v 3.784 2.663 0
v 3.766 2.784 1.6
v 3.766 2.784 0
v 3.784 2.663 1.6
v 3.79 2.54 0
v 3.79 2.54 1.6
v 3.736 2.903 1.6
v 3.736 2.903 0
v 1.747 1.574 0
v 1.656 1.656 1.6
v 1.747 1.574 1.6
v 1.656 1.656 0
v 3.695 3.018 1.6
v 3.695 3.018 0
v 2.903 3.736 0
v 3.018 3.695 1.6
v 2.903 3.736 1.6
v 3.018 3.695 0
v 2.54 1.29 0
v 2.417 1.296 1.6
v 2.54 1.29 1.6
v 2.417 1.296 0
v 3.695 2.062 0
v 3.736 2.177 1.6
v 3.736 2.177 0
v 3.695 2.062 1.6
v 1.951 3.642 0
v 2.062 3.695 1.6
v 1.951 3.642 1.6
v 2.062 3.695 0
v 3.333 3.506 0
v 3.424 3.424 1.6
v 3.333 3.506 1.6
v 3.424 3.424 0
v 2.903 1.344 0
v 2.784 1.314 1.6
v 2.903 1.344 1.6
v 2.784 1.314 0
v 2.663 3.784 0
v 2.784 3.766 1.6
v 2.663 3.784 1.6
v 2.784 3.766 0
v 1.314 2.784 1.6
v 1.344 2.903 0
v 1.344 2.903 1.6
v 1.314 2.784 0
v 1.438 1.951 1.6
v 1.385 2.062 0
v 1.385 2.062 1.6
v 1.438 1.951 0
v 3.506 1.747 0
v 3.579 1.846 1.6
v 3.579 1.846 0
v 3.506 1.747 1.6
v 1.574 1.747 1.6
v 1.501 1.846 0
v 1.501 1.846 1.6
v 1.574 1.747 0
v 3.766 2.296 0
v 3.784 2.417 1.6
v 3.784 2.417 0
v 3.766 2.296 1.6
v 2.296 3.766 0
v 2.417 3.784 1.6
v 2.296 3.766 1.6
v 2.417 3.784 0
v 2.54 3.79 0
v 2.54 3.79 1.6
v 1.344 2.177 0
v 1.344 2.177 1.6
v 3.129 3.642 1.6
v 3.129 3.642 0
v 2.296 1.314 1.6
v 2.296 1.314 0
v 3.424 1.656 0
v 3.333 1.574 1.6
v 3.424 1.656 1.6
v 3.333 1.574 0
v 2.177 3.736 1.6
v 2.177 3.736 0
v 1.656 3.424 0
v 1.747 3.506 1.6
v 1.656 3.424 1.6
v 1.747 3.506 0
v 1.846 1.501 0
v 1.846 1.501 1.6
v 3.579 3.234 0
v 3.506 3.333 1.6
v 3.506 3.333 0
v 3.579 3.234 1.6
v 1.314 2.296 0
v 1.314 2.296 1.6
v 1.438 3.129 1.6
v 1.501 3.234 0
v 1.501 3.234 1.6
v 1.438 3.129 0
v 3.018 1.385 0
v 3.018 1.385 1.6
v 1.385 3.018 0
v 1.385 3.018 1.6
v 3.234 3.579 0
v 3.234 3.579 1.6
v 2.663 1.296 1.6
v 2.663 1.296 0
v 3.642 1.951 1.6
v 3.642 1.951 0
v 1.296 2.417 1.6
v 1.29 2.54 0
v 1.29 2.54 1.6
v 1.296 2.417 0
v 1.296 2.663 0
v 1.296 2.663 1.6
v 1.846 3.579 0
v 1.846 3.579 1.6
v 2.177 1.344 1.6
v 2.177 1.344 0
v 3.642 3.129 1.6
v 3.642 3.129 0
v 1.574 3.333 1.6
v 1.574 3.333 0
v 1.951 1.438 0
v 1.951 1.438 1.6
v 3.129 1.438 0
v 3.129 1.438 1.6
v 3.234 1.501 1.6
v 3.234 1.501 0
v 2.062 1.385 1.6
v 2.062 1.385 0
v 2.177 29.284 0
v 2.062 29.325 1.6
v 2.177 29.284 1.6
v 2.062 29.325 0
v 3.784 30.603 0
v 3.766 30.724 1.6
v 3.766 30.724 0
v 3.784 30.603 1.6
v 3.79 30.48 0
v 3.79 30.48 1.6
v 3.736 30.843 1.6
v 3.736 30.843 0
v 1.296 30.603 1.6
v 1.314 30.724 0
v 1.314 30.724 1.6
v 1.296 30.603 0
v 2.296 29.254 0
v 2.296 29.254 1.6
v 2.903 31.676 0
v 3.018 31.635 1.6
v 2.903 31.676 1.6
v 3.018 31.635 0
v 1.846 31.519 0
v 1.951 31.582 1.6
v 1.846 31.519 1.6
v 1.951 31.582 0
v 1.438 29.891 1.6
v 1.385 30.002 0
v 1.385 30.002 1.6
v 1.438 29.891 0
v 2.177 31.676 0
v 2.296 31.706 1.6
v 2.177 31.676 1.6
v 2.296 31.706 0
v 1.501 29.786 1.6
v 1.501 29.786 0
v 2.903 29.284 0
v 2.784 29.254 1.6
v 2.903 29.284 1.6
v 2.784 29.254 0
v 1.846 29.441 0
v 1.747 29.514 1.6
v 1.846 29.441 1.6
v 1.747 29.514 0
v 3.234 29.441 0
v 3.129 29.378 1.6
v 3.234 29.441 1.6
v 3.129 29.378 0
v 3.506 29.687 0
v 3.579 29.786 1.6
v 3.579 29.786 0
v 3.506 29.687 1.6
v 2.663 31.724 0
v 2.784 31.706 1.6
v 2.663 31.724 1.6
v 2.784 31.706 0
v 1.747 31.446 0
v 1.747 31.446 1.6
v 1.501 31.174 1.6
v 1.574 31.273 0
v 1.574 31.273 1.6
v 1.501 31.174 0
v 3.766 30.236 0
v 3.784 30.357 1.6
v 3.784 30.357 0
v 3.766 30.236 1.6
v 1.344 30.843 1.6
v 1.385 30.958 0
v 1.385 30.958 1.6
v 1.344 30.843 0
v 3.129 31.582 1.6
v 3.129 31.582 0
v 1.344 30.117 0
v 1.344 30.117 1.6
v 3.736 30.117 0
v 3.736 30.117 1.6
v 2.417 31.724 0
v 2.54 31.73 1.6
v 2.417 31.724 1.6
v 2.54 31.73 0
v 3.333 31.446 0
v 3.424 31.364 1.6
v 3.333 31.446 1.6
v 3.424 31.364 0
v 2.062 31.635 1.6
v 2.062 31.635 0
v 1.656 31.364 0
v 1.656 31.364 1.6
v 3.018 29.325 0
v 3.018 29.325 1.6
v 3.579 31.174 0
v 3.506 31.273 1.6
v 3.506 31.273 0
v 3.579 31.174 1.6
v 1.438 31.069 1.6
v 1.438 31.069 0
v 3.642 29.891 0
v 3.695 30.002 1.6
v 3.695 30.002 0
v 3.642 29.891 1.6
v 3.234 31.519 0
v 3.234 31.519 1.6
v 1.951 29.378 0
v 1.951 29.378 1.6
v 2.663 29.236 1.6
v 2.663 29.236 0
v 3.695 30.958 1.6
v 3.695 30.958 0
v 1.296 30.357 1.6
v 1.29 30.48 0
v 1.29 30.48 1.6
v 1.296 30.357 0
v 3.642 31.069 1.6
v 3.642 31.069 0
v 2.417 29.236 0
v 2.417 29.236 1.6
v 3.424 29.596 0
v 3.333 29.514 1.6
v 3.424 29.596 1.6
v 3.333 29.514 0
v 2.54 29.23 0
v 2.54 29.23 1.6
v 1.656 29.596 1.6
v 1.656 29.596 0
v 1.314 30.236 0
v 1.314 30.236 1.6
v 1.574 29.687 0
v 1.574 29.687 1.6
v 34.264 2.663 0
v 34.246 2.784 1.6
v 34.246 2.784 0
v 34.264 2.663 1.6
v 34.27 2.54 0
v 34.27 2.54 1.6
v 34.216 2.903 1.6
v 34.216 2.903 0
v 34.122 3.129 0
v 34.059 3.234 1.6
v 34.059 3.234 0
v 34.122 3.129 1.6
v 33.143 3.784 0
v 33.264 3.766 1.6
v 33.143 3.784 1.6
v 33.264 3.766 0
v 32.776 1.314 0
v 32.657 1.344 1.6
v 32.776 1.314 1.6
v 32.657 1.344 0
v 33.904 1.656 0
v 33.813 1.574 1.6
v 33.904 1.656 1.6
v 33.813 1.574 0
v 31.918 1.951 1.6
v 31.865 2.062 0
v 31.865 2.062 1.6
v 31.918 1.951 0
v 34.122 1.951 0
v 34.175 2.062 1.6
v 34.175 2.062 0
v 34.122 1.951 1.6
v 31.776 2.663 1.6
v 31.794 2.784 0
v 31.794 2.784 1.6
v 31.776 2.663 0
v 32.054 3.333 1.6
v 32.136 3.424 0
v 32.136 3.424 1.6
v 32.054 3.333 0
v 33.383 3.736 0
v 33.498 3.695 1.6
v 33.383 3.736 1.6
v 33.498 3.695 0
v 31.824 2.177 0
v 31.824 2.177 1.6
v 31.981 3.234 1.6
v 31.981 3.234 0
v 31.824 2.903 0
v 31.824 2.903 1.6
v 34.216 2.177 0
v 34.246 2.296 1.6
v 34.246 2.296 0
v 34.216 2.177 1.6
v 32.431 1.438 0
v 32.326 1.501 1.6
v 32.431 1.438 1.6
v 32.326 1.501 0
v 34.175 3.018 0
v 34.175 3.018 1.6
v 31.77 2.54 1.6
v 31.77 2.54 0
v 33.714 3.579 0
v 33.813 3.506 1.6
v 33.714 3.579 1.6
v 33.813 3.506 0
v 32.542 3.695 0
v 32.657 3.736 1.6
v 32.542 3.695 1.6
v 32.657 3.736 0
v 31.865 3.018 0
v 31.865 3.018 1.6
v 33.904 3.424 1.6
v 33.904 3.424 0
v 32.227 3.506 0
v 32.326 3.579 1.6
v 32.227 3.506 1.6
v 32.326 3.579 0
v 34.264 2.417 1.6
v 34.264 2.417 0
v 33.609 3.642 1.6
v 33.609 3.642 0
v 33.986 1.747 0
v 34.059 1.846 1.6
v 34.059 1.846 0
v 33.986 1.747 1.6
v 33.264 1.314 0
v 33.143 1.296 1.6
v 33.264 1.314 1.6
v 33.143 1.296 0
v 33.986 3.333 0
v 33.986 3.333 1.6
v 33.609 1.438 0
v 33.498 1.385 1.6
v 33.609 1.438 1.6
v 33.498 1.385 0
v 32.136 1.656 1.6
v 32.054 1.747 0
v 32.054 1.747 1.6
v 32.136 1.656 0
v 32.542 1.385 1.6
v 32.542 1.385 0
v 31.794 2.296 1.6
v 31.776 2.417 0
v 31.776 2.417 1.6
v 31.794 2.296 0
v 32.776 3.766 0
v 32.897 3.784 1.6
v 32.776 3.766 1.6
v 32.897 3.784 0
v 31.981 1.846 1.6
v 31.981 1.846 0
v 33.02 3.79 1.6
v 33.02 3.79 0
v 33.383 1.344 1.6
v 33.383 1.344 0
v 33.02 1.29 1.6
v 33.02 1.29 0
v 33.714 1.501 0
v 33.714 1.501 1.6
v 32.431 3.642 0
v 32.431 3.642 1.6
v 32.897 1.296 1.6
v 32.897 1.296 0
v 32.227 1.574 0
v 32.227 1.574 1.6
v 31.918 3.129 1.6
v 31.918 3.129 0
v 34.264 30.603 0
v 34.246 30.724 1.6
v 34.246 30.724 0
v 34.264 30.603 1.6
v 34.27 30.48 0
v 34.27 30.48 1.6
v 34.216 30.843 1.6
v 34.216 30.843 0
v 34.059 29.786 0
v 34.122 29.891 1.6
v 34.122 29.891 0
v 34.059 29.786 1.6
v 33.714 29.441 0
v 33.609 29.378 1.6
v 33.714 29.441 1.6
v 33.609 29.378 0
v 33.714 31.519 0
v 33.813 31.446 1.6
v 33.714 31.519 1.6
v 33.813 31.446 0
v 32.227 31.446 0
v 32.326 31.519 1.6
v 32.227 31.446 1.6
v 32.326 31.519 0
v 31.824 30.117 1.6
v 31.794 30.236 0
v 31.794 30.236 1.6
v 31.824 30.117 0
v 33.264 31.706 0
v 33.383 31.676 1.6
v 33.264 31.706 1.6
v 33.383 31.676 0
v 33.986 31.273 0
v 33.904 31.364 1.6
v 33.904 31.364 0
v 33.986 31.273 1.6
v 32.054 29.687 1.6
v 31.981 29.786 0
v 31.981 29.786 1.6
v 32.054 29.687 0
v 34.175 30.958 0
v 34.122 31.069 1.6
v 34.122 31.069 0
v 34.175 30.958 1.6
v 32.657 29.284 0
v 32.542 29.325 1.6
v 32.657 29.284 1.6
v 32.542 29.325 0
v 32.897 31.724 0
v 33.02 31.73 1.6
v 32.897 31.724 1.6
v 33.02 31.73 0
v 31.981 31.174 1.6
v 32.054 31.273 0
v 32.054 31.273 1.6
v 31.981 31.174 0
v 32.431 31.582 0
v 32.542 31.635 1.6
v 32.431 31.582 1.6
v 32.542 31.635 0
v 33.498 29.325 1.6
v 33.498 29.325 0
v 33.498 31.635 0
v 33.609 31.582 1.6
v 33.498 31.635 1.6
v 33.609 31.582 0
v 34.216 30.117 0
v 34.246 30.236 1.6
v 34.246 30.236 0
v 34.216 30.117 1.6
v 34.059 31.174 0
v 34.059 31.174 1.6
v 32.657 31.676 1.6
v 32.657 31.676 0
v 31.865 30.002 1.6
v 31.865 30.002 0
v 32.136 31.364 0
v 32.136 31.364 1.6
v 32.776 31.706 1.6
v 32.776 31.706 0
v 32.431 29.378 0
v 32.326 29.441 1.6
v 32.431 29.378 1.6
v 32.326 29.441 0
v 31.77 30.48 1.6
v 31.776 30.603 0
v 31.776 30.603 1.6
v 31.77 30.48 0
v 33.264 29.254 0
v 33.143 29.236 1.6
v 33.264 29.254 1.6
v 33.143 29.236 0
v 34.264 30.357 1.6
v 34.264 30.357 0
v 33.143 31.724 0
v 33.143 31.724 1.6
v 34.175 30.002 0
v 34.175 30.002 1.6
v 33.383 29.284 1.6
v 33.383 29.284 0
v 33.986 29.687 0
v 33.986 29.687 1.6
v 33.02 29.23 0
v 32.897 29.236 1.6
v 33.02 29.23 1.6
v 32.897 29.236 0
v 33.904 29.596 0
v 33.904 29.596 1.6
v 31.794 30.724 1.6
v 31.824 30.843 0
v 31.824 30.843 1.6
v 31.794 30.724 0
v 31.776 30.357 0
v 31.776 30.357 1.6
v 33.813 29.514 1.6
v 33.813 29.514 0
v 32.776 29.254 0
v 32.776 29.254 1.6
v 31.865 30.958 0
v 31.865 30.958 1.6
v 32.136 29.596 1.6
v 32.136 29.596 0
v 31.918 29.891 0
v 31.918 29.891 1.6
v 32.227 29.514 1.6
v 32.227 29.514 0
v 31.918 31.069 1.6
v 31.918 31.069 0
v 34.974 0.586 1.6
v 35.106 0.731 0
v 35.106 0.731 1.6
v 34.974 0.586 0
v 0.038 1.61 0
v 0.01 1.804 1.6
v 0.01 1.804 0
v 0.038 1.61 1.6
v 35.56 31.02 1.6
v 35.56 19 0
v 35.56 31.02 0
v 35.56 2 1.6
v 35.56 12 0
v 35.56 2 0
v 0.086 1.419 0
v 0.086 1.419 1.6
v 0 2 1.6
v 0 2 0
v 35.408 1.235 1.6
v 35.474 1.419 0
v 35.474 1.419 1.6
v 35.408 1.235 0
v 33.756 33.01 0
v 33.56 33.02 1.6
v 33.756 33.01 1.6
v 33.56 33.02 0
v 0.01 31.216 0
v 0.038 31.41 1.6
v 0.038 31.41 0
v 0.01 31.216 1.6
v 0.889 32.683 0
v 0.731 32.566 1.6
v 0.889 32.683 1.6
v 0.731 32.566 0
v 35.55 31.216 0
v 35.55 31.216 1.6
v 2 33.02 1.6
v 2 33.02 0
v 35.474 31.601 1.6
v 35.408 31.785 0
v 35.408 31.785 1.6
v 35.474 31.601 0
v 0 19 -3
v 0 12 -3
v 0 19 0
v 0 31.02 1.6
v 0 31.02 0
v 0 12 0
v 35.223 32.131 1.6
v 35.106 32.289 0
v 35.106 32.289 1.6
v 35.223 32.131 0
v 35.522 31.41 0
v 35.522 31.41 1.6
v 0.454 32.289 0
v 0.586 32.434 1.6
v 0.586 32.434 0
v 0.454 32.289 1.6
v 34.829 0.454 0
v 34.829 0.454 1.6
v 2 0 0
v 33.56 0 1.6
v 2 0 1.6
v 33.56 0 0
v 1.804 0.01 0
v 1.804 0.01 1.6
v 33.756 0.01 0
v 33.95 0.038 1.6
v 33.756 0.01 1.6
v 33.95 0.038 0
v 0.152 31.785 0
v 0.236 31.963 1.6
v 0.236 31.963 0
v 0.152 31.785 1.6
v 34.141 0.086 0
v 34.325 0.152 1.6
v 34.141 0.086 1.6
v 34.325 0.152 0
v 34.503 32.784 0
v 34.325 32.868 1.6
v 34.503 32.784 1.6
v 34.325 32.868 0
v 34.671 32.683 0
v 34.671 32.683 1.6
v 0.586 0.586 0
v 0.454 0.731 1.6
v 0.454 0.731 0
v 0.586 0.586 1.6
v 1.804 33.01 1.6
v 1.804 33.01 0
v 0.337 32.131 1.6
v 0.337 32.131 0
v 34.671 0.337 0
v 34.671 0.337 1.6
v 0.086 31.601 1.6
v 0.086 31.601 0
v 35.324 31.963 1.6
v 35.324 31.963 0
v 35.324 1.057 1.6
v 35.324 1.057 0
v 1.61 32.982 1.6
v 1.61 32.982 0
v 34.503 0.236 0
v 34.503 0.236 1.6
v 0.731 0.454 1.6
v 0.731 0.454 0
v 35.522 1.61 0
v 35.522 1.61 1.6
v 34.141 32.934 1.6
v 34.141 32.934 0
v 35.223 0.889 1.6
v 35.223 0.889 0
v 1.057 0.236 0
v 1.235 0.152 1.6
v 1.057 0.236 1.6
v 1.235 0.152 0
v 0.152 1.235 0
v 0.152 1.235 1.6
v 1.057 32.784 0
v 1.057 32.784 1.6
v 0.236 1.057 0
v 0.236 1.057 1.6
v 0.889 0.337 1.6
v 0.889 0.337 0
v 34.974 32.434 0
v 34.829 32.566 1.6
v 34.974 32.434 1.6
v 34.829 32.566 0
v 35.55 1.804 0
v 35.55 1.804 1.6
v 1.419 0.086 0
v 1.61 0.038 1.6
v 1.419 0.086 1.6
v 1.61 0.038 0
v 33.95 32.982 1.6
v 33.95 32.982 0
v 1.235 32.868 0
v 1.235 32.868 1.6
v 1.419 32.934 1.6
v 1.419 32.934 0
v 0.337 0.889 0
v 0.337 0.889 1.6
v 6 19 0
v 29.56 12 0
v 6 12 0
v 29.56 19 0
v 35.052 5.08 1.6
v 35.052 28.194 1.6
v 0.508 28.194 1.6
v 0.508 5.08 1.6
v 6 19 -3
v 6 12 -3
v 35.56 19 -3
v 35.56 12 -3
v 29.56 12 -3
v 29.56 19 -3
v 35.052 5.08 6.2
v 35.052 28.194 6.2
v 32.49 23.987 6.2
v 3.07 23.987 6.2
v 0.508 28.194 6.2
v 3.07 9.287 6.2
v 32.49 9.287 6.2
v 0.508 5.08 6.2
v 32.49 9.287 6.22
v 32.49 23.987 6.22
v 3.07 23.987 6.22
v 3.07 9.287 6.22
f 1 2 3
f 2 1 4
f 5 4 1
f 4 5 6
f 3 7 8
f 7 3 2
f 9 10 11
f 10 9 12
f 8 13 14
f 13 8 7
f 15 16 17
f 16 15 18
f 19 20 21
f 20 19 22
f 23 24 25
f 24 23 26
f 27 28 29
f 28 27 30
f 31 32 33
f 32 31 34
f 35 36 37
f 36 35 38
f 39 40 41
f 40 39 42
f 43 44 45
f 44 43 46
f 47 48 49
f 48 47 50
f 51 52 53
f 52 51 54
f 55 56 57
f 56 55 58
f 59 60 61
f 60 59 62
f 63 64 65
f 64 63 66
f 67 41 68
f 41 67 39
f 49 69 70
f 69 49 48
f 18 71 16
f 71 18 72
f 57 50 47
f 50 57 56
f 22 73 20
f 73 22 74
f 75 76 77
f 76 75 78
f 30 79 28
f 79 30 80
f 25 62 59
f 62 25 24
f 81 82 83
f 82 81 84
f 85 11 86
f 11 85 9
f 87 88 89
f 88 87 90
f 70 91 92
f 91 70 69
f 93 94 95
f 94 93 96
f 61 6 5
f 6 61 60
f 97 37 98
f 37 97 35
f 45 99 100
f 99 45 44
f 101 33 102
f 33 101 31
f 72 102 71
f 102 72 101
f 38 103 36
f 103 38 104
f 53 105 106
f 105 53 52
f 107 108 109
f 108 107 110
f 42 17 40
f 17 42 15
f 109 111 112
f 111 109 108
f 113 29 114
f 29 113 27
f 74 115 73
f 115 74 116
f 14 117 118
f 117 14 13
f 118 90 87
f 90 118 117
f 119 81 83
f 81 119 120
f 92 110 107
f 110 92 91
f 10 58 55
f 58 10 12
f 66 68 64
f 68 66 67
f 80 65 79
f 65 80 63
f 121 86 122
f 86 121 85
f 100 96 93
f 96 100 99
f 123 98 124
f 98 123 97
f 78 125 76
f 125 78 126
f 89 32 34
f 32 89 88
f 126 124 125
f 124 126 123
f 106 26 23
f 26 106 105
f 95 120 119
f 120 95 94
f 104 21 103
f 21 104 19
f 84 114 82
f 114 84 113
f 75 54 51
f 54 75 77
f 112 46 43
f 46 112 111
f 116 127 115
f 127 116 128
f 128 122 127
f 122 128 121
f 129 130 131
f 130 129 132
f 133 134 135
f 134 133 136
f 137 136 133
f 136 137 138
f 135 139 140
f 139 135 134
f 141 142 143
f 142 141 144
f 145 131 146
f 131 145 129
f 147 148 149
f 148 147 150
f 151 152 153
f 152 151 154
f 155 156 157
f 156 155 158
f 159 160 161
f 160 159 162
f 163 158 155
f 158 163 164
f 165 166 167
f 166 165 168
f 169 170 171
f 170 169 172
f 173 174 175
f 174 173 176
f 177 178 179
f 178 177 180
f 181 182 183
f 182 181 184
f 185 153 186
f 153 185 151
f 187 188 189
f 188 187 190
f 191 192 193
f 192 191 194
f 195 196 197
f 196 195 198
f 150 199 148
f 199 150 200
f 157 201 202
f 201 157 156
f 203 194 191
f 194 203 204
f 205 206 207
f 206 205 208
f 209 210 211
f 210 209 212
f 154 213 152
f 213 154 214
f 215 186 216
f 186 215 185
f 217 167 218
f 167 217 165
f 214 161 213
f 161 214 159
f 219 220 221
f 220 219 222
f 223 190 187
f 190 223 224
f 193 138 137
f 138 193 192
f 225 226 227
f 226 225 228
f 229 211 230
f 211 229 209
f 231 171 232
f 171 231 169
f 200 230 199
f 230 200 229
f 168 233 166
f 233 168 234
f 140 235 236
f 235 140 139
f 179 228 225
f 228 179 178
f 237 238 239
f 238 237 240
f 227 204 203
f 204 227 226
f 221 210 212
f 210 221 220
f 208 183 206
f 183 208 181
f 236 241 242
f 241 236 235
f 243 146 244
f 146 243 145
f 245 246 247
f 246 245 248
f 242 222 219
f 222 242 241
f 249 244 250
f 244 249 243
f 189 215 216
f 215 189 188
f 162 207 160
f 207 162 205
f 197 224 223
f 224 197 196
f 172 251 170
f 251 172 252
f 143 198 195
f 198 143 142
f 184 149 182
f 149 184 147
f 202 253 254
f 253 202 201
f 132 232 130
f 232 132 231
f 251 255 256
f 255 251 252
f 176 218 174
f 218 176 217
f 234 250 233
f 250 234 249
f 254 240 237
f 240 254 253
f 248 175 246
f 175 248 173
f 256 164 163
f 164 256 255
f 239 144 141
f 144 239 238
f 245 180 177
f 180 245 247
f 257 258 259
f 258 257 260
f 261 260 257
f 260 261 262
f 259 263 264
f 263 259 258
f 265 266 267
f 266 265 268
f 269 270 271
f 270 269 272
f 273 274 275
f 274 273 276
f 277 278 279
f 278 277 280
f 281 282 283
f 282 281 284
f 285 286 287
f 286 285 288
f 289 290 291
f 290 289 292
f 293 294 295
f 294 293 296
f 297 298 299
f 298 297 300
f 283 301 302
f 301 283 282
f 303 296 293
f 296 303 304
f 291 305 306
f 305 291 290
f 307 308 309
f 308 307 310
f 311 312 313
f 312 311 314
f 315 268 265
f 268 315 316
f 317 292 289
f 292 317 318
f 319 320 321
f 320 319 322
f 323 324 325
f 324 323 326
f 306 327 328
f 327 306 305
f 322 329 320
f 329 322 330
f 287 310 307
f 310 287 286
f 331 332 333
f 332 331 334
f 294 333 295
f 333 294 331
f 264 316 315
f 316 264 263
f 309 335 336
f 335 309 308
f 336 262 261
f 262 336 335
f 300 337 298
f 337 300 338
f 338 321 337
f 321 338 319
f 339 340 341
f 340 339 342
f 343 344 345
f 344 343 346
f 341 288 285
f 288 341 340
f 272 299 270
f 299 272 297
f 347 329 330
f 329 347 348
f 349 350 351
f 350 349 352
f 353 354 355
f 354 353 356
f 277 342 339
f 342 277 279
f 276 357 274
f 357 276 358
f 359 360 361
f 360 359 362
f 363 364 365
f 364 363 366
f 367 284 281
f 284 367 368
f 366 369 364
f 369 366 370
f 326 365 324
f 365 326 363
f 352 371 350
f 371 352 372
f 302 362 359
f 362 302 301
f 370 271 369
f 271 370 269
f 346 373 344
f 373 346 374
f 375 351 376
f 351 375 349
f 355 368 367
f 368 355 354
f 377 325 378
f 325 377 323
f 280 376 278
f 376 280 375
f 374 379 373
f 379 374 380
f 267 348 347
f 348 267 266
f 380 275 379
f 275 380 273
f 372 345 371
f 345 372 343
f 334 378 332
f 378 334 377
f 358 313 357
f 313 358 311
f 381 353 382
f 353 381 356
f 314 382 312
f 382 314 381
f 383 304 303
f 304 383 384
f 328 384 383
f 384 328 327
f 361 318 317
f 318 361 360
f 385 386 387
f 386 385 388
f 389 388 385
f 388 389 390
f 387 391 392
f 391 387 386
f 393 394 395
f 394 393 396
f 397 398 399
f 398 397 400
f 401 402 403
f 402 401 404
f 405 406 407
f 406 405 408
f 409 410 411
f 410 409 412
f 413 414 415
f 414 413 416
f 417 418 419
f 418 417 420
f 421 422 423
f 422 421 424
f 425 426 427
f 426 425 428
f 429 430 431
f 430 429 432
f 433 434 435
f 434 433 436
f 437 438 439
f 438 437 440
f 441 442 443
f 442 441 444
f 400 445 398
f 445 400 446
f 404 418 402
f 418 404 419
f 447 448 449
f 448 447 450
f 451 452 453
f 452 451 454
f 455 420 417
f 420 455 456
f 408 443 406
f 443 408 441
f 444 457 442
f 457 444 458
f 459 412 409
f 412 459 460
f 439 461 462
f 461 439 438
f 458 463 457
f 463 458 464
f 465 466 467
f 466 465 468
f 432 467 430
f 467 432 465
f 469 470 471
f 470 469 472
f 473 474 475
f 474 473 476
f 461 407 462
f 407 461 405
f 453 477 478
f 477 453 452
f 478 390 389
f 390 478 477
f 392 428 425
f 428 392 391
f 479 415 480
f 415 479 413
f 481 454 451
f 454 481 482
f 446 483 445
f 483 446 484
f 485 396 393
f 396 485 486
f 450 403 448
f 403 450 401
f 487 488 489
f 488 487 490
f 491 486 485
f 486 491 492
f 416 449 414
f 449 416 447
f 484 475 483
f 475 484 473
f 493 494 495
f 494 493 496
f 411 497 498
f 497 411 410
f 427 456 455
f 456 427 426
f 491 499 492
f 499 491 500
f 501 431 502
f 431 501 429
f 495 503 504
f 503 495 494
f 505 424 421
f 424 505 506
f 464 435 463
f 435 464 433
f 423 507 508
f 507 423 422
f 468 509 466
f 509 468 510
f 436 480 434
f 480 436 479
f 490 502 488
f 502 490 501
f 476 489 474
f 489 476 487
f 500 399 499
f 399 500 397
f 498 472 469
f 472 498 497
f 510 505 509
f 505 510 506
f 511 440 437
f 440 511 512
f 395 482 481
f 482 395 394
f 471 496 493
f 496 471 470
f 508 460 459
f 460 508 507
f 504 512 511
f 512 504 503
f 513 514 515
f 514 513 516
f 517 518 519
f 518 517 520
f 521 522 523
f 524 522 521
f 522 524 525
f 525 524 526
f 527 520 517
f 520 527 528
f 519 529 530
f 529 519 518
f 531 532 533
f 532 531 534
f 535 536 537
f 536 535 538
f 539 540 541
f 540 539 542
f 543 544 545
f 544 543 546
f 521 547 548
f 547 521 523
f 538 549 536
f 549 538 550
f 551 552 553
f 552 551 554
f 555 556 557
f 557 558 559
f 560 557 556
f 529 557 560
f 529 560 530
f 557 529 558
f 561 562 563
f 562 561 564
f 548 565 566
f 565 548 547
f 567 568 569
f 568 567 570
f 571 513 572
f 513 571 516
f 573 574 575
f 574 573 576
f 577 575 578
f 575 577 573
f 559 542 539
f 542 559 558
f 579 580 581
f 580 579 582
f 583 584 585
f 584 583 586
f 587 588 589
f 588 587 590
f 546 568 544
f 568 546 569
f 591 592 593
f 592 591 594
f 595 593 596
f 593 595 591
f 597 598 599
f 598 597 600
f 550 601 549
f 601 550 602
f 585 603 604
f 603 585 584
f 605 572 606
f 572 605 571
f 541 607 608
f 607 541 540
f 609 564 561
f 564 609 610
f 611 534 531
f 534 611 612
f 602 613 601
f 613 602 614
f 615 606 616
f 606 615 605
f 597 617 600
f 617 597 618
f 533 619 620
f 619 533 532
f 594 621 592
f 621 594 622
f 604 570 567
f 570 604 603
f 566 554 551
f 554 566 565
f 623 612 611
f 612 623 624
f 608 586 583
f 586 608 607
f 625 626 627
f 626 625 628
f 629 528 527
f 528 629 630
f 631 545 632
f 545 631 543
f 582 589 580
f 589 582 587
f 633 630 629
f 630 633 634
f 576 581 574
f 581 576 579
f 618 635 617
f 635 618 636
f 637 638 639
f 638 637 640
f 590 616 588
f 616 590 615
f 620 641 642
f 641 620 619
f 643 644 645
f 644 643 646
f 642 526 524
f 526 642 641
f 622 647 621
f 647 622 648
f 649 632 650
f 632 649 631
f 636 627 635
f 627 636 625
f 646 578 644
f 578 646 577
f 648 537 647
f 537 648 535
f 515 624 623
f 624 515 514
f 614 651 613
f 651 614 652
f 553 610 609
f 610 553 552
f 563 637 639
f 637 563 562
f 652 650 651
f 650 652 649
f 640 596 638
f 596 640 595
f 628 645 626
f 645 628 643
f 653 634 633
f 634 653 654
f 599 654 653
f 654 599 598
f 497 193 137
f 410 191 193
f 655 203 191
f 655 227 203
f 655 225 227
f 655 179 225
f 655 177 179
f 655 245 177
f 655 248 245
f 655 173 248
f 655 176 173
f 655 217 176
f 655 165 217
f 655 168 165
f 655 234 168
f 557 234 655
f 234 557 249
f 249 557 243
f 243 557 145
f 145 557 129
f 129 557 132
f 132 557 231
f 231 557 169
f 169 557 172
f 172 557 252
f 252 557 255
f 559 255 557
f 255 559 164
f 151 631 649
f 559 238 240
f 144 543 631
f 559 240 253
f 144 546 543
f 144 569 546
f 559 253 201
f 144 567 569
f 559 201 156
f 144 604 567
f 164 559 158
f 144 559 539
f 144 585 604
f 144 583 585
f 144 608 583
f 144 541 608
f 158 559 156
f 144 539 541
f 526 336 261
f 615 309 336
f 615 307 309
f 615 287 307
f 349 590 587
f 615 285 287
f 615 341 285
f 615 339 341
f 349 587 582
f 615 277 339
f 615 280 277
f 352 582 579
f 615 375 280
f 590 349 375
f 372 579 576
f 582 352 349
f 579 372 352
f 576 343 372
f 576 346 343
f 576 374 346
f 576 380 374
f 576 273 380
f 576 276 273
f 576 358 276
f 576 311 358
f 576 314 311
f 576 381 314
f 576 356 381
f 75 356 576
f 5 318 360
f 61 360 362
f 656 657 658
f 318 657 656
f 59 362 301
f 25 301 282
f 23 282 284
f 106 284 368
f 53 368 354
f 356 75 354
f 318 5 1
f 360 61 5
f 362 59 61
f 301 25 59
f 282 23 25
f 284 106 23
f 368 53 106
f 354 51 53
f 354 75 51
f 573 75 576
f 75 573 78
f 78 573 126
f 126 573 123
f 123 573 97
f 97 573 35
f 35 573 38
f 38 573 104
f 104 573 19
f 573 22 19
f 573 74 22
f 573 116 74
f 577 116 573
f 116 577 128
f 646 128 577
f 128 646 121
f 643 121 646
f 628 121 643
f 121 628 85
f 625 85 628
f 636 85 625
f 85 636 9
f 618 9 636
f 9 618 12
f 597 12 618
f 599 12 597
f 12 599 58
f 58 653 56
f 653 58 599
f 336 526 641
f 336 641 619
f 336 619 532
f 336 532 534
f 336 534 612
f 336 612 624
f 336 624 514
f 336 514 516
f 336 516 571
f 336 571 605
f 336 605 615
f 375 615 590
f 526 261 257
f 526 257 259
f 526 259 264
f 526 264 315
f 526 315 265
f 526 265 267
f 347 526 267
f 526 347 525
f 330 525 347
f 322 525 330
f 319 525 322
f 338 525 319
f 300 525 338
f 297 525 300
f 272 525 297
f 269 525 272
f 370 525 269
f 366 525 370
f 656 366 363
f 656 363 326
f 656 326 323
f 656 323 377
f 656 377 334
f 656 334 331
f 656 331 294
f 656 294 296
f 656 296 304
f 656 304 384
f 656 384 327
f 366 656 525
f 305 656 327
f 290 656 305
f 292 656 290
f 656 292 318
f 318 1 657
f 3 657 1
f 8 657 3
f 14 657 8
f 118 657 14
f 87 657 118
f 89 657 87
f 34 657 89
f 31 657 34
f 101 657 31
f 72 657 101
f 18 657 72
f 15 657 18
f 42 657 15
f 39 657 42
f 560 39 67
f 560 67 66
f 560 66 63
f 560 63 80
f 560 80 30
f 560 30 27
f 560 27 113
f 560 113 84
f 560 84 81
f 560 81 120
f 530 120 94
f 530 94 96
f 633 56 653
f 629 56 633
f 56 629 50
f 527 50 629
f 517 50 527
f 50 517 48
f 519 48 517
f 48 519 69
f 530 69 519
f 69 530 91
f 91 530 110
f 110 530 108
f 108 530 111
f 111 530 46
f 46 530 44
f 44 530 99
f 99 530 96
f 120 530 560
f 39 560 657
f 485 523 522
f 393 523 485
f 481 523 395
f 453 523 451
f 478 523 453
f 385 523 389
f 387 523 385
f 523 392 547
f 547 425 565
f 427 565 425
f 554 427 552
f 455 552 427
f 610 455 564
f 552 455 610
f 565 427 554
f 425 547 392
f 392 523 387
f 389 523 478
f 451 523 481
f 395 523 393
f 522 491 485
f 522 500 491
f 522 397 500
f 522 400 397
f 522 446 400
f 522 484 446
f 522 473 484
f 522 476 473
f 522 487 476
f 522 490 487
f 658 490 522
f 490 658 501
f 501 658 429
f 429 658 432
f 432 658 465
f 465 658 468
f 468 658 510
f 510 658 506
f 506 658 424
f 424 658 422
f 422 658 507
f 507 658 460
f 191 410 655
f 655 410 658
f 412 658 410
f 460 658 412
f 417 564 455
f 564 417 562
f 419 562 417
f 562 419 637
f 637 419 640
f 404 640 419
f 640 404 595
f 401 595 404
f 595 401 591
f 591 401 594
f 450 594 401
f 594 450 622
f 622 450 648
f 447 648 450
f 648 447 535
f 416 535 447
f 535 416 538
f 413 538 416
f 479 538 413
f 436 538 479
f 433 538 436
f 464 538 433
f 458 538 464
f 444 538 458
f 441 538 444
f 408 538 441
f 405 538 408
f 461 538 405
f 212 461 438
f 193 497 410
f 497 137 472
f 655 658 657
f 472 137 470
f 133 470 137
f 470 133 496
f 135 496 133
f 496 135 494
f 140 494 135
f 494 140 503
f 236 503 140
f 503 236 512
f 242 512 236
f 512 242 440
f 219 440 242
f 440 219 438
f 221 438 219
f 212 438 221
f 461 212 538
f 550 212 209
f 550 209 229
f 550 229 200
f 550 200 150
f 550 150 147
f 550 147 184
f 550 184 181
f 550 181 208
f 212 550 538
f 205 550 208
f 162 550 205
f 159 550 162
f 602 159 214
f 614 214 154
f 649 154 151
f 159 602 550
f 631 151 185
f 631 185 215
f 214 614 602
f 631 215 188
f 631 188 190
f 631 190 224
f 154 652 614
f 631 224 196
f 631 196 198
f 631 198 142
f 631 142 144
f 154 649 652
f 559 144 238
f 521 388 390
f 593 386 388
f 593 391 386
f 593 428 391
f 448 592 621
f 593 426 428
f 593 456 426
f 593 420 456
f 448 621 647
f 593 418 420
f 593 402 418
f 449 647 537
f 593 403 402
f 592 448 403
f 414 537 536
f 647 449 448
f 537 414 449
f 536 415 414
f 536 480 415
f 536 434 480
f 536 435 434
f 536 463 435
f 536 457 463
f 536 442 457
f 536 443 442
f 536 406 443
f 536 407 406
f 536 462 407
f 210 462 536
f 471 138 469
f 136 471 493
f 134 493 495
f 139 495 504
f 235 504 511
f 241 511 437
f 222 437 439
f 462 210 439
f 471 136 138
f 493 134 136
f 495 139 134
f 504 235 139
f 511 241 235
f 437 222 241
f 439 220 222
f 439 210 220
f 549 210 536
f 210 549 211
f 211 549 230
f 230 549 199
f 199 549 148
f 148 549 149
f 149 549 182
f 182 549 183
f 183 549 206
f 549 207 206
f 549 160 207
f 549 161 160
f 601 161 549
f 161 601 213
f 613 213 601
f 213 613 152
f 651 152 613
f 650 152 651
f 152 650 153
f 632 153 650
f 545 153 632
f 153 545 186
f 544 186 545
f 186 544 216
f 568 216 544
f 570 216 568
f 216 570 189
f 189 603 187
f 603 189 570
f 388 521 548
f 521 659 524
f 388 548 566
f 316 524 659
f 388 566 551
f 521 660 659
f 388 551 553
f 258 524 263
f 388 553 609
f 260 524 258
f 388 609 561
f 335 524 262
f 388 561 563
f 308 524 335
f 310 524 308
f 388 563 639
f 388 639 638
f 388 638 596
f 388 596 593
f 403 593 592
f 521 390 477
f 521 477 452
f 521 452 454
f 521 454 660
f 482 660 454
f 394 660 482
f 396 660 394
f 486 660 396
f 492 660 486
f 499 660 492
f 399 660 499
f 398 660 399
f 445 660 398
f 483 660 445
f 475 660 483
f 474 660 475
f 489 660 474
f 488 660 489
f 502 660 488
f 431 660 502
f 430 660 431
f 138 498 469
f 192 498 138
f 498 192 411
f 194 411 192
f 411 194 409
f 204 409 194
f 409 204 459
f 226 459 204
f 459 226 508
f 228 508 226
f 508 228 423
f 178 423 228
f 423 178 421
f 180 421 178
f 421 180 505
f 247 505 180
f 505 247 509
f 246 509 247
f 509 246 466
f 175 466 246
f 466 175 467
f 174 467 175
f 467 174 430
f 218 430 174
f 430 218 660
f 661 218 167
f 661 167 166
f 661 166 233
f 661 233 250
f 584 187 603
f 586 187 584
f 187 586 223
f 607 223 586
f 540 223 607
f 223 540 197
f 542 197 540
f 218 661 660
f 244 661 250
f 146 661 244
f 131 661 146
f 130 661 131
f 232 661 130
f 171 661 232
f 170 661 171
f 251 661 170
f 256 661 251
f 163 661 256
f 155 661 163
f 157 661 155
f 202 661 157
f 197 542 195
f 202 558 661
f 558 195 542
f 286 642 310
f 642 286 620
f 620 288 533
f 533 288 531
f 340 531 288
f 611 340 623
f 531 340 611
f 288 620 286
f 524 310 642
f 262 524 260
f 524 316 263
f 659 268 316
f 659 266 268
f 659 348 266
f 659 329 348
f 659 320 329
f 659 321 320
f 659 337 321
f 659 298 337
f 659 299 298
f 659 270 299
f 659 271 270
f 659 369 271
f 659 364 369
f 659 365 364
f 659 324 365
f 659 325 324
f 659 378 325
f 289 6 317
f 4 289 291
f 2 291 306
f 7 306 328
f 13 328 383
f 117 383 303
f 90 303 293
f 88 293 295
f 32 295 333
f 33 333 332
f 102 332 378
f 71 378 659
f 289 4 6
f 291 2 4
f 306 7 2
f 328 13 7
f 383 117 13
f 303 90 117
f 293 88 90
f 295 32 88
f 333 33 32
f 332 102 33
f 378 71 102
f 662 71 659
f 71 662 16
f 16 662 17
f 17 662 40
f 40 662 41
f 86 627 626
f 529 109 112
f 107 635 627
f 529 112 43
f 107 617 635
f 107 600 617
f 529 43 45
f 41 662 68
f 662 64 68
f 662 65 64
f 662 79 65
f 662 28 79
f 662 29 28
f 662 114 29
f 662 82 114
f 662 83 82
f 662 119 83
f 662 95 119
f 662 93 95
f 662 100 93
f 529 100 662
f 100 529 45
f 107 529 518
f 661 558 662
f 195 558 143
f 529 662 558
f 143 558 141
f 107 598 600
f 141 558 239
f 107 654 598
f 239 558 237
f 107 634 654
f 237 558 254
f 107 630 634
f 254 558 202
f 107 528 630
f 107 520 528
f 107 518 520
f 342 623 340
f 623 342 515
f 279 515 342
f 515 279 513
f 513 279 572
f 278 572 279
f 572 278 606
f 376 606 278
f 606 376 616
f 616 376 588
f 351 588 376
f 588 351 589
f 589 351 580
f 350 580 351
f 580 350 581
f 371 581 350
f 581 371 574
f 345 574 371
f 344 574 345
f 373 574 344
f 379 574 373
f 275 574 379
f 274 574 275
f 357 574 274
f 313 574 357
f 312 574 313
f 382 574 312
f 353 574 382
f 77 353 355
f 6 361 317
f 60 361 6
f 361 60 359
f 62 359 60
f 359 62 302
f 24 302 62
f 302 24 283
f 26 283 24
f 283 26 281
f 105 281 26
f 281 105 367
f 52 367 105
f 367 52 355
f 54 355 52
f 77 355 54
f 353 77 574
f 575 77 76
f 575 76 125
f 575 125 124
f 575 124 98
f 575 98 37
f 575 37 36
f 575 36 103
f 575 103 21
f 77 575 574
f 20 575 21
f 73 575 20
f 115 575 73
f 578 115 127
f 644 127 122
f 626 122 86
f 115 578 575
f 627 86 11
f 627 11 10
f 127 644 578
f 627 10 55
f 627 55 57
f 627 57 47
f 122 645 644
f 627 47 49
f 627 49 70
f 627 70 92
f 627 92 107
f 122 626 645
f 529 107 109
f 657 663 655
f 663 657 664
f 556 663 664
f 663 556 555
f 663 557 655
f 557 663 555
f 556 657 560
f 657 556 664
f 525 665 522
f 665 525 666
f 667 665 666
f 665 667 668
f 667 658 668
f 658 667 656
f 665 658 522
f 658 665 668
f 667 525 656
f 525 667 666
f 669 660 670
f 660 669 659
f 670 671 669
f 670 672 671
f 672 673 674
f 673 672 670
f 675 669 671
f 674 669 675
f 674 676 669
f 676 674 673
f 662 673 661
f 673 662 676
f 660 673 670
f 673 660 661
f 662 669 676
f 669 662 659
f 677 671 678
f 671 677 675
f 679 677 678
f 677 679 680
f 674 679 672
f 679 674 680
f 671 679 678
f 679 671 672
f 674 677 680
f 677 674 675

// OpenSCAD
include <../common.scad>
// All PCB, glass and connector dimensions are named in common.scad.
module oled938(){
 color([0.025,0.11,0.17])difference(){rounded_box([oled_w,oled_l,oled_pcb],oled_corner_r);for(x=oled_hole_x,y=oled_hole_y)translate([x,y,-eps])cylinder(d=oled_hole_d,h=oled_pcb+2*eps);}
 color([0.025,0.03,0.04])translate([(oled_w-oled_glass_w)/2,oled_glass_y,oled_pcb])cube([oled_glass_w,oled_glass_l,oled_depth-oled_pcb]);
 color([0.06,0.18,0.23])translate([(oled_w-oled_active_w)/2,oled_active_y-oled_active_l/2,oled_depth])cube([oled_active_w,oled_active_l,oled_visual_t]);
 color([0.08,0.08,0.09])for(x=[0,oled_w-oled_connector_w])translate([x,oled_connector_y,-oled_back_depth])cube([oled_connector_w,oled_connector_l,oled_back_depth]);
}
oled938();
